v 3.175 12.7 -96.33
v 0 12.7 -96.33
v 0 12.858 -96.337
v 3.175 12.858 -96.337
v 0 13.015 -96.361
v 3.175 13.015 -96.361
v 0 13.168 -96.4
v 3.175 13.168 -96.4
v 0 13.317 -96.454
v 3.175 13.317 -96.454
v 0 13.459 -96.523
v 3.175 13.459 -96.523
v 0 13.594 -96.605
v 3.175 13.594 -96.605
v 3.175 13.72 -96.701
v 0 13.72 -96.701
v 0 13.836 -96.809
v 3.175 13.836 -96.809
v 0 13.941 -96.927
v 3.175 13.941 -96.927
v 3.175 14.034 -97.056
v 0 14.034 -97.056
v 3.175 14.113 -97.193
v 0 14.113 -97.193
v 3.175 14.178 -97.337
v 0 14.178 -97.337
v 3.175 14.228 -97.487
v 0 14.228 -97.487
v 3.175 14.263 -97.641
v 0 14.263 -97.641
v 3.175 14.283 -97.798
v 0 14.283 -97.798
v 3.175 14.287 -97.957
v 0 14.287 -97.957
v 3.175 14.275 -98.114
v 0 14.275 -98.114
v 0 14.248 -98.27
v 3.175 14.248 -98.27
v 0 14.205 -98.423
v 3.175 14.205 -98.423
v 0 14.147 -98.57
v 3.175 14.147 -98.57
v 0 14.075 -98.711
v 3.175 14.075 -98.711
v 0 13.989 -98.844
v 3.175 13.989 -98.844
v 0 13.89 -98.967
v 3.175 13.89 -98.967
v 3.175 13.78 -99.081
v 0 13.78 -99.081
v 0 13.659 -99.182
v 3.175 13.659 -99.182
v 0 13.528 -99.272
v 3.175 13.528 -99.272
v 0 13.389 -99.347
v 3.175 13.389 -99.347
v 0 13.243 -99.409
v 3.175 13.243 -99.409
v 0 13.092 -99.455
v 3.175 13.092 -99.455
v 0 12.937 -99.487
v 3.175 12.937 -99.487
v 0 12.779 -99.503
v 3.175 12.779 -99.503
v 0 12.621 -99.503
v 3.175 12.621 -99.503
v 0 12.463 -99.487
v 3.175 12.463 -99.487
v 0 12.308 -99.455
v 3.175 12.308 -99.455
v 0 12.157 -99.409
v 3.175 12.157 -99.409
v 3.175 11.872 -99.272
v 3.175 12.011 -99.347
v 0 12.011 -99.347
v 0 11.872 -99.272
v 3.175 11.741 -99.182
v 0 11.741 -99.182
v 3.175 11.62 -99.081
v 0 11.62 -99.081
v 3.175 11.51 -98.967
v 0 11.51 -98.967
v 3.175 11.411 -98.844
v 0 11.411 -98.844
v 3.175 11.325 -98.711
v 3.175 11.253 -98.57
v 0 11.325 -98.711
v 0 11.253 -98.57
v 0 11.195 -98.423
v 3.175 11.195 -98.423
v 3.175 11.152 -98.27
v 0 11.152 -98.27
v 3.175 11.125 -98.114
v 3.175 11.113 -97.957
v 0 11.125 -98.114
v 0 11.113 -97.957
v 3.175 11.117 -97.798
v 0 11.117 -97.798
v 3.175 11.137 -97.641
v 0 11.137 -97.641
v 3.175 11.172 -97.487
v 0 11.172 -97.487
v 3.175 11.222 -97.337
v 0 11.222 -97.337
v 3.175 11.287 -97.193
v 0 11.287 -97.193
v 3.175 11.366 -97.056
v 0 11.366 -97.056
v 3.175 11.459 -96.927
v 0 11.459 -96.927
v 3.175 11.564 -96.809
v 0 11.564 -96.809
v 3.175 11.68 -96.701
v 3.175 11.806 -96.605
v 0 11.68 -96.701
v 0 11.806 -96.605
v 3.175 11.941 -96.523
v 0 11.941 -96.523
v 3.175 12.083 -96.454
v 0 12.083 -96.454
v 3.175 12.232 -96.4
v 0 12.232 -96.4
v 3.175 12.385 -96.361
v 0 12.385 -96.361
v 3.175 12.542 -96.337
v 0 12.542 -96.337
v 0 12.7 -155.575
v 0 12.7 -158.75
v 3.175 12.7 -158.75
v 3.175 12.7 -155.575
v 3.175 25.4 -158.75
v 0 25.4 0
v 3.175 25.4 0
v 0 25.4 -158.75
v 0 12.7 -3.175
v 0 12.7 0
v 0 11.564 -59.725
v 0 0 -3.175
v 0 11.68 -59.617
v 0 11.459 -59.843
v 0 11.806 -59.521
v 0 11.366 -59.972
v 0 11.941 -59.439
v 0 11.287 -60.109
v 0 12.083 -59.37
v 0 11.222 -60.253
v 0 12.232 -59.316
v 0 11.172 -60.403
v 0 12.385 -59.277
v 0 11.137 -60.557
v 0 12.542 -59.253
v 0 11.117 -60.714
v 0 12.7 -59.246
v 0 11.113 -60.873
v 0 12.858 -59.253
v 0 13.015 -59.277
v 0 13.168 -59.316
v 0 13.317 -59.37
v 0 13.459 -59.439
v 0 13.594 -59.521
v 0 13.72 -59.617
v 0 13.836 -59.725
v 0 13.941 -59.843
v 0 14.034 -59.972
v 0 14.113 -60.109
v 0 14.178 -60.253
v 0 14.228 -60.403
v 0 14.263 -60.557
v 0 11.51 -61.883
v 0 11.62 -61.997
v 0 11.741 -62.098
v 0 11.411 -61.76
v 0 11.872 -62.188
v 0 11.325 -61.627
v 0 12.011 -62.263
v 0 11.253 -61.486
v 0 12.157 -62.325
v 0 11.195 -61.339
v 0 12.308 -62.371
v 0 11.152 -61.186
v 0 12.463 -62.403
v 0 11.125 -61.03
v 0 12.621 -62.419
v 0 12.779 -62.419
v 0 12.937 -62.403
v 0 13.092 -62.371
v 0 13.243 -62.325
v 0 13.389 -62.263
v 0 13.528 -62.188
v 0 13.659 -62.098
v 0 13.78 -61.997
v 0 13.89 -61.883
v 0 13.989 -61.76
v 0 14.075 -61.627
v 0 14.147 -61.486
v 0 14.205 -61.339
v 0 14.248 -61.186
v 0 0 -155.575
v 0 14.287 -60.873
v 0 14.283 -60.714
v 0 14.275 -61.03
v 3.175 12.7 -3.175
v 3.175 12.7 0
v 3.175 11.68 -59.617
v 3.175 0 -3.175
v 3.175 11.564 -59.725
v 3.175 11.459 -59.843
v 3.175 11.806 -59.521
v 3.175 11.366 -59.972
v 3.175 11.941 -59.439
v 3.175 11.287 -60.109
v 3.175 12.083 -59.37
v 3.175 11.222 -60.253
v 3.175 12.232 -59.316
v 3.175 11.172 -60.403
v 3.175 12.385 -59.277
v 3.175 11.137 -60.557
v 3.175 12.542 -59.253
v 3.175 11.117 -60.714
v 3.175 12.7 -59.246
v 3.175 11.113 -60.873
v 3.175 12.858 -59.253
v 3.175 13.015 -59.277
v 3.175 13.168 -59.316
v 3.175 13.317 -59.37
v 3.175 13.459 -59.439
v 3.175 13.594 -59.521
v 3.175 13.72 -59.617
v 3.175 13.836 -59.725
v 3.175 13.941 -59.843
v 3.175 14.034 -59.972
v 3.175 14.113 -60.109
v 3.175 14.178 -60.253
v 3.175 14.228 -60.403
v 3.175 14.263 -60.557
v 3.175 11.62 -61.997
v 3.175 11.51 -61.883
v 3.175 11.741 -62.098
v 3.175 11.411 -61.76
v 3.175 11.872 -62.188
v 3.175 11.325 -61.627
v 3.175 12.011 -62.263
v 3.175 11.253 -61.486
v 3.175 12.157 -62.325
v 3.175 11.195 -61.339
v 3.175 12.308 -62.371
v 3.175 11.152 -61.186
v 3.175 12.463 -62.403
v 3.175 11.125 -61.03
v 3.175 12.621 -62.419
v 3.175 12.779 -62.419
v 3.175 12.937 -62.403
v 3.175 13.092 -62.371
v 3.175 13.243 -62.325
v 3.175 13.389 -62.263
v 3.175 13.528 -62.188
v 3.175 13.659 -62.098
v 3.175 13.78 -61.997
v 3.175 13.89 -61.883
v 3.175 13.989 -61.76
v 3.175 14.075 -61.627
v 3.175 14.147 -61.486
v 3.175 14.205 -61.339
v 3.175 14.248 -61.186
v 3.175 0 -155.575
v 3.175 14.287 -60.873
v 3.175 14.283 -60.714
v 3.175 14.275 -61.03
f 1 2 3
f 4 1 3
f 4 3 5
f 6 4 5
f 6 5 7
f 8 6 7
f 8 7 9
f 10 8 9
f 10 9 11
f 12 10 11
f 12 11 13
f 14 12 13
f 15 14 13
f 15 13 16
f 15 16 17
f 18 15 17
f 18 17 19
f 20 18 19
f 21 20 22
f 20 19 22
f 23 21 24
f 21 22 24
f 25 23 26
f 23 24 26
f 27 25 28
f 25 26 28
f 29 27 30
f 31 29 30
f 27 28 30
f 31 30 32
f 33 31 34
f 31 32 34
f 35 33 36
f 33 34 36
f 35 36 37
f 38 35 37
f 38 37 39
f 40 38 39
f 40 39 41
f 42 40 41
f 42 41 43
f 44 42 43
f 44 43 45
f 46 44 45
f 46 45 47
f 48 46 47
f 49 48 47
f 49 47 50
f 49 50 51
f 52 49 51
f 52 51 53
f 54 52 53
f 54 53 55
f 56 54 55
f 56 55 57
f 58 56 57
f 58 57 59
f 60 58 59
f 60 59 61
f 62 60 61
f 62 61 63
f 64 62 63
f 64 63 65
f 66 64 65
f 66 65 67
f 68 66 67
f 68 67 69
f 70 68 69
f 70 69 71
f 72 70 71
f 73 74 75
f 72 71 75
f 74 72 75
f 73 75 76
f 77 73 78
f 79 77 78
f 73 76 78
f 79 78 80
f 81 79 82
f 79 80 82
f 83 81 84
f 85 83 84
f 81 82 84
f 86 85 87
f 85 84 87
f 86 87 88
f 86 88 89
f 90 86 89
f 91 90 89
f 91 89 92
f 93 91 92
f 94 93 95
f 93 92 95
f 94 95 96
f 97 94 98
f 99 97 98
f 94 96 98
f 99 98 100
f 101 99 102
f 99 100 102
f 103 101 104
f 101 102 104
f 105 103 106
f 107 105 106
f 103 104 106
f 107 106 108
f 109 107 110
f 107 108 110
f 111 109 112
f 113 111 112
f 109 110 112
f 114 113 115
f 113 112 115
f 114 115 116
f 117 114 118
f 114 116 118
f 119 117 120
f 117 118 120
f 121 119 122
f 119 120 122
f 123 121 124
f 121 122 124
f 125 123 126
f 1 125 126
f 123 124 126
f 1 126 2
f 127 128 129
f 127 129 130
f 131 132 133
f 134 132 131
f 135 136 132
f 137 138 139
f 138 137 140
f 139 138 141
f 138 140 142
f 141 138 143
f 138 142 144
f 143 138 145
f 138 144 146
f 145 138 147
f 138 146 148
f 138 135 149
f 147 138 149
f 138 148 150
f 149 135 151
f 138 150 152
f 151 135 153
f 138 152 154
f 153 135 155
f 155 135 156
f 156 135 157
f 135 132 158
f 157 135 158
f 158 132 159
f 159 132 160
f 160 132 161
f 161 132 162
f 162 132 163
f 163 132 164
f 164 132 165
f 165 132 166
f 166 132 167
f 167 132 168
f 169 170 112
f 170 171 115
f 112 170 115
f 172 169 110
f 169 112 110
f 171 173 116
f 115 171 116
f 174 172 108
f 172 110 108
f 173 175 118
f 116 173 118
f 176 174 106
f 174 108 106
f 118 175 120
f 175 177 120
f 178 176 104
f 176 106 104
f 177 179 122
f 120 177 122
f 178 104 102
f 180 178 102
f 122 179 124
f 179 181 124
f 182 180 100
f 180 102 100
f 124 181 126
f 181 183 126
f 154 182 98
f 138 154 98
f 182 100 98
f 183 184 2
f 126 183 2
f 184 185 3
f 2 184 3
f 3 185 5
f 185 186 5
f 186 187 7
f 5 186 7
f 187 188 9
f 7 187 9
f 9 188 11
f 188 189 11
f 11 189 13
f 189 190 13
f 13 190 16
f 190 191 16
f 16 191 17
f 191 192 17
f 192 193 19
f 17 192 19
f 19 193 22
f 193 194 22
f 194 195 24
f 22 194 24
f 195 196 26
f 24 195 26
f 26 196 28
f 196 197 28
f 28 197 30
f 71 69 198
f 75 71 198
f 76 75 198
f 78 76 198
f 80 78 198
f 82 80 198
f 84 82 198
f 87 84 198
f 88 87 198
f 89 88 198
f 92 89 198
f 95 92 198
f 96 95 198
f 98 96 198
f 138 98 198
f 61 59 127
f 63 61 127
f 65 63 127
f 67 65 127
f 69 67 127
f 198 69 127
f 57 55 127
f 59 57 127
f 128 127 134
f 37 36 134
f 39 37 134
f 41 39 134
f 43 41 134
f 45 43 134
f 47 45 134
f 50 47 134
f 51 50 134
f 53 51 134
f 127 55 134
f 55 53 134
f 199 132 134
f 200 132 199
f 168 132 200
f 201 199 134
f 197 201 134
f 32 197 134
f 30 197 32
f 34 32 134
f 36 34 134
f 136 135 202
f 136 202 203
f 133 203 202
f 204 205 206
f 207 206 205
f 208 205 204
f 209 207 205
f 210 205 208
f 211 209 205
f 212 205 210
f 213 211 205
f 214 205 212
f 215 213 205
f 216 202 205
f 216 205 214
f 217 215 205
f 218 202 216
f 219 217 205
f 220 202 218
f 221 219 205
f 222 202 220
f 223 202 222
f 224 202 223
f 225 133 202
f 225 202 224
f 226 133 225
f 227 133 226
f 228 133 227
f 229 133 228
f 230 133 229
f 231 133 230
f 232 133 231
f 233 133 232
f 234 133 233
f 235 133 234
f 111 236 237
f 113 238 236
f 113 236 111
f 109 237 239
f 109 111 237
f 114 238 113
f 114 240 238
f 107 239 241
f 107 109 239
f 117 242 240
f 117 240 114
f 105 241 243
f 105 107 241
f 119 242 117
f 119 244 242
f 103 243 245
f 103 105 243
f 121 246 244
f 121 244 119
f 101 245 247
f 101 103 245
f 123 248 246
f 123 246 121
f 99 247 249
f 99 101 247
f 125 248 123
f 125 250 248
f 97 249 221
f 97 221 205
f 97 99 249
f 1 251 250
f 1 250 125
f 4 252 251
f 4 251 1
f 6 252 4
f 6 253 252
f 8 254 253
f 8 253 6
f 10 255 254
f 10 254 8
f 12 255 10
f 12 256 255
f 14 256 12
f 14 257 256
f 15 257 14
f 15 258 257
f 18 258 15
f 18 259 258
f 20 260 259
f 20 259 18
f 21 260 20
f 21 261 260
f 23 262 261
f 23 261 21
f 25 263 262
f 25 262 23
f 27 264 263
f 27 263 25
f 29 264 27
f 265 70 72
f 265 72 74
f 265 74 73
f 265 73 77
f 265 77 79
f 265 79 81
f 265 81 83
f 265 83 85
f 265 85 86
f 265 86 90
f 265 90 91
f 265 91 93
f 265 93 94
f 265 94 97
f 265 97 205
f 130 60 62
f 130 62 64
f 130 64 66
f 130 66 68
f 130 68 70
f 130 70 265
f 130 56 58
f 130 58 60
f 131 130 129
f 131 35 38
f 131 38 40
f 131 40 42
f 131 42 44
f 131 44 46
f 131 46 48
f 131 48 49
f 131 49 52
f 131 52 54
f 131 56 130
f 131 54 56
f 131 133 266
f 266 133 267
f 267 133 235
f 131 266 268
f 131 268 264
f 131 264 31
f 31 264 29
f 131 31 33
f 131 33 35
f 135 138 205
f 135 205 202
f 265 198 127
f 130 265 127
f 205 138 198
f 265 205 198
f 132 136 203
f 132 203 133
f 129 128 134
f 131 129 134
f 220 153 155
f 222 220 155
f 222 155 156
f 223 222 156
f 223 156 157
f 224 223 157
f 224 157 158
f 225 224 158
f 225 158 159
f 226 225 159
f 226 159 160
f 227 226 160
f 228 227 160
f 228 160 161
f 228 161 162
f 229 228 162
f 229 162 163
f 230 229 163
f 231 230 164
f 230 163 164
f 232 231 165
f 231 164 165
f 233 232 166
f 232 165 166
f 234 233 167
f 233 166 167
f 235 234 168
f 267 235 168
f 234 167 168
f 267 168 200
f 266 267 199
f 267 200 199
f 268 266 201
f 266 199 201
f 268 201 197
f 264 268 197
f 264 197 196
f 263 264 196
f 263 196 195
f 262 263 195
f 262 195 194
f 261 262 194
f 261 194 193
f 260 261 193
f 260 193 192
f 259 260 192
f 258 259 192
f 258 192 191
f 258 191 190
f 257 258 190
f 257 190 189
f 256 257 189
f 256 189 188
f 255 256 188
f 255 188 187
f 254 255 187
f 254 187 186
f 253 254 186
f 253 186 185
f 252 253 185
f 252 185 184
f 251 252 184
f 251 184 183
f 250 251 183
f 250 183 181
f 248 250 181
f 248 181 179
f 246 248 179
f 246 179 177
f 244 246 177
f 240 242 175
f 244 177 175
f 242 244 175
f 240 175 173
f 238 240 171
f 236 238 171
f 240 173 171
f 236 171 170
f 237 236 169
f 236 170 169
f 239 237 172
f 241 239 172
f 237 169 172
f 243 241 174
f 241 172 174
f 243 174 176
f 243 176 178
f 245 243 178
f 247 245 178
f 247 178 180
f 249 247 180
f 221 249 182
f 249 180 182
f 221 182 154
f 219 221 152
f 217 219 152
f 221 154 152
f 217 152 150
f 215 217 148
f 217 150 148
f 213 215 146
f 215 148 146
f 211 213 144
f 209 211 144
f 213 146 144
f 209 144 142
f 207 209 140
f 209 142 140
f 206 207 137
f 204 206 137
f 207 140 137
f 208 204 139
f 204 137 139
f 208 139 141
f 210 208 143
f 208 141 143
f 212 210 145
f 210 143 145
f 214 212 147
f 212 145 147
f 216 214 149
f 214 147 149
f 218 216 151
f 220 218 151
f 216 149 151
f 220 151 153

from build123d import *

# Parameters (mm, degrees)
SKETCH1_W           = 158.75
SKETCH1_H           = 25.4
BOSS_EXTRUDE1_DEPTH = 3.175
SKETCH2_R           = 1.5875
SKETCH2_W           = 3.175
SKETCH2_H           = 12.7
CUT_EXTRUDE1_DEPTH  = 4.175


with BuildPart() as part:
    # Sketch1 → Boss-Extrude1 (new body)
    with BuildSketch(Plane(origin=(0, 0, 0), x_dir=(0, 0, -1), z_dir=(1, 0, 0))):
        with Locations((79.375, 12.7)):
            Rectangle(SKETCH1_W, SKETCH1_H)
    extrude(amount=BOSS_EXTRUDE1_DEPTH)

    # Sketch2 → Cut-Extrude1 (cut, through all)
    with BuildSketch(Plane.ZY):
        with Locations((-97.917, 12.7)):
            Circle(SKETCH2_R)
        with Locations((-60.833, 12.7)):
            Circle(SKETCH2_R)
        with Locations((-1.5875, 6.35)):
            Rectangle(SKETCH2_W, SKETCH2_H)
        with Locations((-157.1625, 6.35)):
            Rectangle(SKETCH2_W, SKETCH2_H)
    extrude(amount=-CUT_EXTRUDE1_DEPTH, mode=Mode.SUBTRACT)


solid = part.part
